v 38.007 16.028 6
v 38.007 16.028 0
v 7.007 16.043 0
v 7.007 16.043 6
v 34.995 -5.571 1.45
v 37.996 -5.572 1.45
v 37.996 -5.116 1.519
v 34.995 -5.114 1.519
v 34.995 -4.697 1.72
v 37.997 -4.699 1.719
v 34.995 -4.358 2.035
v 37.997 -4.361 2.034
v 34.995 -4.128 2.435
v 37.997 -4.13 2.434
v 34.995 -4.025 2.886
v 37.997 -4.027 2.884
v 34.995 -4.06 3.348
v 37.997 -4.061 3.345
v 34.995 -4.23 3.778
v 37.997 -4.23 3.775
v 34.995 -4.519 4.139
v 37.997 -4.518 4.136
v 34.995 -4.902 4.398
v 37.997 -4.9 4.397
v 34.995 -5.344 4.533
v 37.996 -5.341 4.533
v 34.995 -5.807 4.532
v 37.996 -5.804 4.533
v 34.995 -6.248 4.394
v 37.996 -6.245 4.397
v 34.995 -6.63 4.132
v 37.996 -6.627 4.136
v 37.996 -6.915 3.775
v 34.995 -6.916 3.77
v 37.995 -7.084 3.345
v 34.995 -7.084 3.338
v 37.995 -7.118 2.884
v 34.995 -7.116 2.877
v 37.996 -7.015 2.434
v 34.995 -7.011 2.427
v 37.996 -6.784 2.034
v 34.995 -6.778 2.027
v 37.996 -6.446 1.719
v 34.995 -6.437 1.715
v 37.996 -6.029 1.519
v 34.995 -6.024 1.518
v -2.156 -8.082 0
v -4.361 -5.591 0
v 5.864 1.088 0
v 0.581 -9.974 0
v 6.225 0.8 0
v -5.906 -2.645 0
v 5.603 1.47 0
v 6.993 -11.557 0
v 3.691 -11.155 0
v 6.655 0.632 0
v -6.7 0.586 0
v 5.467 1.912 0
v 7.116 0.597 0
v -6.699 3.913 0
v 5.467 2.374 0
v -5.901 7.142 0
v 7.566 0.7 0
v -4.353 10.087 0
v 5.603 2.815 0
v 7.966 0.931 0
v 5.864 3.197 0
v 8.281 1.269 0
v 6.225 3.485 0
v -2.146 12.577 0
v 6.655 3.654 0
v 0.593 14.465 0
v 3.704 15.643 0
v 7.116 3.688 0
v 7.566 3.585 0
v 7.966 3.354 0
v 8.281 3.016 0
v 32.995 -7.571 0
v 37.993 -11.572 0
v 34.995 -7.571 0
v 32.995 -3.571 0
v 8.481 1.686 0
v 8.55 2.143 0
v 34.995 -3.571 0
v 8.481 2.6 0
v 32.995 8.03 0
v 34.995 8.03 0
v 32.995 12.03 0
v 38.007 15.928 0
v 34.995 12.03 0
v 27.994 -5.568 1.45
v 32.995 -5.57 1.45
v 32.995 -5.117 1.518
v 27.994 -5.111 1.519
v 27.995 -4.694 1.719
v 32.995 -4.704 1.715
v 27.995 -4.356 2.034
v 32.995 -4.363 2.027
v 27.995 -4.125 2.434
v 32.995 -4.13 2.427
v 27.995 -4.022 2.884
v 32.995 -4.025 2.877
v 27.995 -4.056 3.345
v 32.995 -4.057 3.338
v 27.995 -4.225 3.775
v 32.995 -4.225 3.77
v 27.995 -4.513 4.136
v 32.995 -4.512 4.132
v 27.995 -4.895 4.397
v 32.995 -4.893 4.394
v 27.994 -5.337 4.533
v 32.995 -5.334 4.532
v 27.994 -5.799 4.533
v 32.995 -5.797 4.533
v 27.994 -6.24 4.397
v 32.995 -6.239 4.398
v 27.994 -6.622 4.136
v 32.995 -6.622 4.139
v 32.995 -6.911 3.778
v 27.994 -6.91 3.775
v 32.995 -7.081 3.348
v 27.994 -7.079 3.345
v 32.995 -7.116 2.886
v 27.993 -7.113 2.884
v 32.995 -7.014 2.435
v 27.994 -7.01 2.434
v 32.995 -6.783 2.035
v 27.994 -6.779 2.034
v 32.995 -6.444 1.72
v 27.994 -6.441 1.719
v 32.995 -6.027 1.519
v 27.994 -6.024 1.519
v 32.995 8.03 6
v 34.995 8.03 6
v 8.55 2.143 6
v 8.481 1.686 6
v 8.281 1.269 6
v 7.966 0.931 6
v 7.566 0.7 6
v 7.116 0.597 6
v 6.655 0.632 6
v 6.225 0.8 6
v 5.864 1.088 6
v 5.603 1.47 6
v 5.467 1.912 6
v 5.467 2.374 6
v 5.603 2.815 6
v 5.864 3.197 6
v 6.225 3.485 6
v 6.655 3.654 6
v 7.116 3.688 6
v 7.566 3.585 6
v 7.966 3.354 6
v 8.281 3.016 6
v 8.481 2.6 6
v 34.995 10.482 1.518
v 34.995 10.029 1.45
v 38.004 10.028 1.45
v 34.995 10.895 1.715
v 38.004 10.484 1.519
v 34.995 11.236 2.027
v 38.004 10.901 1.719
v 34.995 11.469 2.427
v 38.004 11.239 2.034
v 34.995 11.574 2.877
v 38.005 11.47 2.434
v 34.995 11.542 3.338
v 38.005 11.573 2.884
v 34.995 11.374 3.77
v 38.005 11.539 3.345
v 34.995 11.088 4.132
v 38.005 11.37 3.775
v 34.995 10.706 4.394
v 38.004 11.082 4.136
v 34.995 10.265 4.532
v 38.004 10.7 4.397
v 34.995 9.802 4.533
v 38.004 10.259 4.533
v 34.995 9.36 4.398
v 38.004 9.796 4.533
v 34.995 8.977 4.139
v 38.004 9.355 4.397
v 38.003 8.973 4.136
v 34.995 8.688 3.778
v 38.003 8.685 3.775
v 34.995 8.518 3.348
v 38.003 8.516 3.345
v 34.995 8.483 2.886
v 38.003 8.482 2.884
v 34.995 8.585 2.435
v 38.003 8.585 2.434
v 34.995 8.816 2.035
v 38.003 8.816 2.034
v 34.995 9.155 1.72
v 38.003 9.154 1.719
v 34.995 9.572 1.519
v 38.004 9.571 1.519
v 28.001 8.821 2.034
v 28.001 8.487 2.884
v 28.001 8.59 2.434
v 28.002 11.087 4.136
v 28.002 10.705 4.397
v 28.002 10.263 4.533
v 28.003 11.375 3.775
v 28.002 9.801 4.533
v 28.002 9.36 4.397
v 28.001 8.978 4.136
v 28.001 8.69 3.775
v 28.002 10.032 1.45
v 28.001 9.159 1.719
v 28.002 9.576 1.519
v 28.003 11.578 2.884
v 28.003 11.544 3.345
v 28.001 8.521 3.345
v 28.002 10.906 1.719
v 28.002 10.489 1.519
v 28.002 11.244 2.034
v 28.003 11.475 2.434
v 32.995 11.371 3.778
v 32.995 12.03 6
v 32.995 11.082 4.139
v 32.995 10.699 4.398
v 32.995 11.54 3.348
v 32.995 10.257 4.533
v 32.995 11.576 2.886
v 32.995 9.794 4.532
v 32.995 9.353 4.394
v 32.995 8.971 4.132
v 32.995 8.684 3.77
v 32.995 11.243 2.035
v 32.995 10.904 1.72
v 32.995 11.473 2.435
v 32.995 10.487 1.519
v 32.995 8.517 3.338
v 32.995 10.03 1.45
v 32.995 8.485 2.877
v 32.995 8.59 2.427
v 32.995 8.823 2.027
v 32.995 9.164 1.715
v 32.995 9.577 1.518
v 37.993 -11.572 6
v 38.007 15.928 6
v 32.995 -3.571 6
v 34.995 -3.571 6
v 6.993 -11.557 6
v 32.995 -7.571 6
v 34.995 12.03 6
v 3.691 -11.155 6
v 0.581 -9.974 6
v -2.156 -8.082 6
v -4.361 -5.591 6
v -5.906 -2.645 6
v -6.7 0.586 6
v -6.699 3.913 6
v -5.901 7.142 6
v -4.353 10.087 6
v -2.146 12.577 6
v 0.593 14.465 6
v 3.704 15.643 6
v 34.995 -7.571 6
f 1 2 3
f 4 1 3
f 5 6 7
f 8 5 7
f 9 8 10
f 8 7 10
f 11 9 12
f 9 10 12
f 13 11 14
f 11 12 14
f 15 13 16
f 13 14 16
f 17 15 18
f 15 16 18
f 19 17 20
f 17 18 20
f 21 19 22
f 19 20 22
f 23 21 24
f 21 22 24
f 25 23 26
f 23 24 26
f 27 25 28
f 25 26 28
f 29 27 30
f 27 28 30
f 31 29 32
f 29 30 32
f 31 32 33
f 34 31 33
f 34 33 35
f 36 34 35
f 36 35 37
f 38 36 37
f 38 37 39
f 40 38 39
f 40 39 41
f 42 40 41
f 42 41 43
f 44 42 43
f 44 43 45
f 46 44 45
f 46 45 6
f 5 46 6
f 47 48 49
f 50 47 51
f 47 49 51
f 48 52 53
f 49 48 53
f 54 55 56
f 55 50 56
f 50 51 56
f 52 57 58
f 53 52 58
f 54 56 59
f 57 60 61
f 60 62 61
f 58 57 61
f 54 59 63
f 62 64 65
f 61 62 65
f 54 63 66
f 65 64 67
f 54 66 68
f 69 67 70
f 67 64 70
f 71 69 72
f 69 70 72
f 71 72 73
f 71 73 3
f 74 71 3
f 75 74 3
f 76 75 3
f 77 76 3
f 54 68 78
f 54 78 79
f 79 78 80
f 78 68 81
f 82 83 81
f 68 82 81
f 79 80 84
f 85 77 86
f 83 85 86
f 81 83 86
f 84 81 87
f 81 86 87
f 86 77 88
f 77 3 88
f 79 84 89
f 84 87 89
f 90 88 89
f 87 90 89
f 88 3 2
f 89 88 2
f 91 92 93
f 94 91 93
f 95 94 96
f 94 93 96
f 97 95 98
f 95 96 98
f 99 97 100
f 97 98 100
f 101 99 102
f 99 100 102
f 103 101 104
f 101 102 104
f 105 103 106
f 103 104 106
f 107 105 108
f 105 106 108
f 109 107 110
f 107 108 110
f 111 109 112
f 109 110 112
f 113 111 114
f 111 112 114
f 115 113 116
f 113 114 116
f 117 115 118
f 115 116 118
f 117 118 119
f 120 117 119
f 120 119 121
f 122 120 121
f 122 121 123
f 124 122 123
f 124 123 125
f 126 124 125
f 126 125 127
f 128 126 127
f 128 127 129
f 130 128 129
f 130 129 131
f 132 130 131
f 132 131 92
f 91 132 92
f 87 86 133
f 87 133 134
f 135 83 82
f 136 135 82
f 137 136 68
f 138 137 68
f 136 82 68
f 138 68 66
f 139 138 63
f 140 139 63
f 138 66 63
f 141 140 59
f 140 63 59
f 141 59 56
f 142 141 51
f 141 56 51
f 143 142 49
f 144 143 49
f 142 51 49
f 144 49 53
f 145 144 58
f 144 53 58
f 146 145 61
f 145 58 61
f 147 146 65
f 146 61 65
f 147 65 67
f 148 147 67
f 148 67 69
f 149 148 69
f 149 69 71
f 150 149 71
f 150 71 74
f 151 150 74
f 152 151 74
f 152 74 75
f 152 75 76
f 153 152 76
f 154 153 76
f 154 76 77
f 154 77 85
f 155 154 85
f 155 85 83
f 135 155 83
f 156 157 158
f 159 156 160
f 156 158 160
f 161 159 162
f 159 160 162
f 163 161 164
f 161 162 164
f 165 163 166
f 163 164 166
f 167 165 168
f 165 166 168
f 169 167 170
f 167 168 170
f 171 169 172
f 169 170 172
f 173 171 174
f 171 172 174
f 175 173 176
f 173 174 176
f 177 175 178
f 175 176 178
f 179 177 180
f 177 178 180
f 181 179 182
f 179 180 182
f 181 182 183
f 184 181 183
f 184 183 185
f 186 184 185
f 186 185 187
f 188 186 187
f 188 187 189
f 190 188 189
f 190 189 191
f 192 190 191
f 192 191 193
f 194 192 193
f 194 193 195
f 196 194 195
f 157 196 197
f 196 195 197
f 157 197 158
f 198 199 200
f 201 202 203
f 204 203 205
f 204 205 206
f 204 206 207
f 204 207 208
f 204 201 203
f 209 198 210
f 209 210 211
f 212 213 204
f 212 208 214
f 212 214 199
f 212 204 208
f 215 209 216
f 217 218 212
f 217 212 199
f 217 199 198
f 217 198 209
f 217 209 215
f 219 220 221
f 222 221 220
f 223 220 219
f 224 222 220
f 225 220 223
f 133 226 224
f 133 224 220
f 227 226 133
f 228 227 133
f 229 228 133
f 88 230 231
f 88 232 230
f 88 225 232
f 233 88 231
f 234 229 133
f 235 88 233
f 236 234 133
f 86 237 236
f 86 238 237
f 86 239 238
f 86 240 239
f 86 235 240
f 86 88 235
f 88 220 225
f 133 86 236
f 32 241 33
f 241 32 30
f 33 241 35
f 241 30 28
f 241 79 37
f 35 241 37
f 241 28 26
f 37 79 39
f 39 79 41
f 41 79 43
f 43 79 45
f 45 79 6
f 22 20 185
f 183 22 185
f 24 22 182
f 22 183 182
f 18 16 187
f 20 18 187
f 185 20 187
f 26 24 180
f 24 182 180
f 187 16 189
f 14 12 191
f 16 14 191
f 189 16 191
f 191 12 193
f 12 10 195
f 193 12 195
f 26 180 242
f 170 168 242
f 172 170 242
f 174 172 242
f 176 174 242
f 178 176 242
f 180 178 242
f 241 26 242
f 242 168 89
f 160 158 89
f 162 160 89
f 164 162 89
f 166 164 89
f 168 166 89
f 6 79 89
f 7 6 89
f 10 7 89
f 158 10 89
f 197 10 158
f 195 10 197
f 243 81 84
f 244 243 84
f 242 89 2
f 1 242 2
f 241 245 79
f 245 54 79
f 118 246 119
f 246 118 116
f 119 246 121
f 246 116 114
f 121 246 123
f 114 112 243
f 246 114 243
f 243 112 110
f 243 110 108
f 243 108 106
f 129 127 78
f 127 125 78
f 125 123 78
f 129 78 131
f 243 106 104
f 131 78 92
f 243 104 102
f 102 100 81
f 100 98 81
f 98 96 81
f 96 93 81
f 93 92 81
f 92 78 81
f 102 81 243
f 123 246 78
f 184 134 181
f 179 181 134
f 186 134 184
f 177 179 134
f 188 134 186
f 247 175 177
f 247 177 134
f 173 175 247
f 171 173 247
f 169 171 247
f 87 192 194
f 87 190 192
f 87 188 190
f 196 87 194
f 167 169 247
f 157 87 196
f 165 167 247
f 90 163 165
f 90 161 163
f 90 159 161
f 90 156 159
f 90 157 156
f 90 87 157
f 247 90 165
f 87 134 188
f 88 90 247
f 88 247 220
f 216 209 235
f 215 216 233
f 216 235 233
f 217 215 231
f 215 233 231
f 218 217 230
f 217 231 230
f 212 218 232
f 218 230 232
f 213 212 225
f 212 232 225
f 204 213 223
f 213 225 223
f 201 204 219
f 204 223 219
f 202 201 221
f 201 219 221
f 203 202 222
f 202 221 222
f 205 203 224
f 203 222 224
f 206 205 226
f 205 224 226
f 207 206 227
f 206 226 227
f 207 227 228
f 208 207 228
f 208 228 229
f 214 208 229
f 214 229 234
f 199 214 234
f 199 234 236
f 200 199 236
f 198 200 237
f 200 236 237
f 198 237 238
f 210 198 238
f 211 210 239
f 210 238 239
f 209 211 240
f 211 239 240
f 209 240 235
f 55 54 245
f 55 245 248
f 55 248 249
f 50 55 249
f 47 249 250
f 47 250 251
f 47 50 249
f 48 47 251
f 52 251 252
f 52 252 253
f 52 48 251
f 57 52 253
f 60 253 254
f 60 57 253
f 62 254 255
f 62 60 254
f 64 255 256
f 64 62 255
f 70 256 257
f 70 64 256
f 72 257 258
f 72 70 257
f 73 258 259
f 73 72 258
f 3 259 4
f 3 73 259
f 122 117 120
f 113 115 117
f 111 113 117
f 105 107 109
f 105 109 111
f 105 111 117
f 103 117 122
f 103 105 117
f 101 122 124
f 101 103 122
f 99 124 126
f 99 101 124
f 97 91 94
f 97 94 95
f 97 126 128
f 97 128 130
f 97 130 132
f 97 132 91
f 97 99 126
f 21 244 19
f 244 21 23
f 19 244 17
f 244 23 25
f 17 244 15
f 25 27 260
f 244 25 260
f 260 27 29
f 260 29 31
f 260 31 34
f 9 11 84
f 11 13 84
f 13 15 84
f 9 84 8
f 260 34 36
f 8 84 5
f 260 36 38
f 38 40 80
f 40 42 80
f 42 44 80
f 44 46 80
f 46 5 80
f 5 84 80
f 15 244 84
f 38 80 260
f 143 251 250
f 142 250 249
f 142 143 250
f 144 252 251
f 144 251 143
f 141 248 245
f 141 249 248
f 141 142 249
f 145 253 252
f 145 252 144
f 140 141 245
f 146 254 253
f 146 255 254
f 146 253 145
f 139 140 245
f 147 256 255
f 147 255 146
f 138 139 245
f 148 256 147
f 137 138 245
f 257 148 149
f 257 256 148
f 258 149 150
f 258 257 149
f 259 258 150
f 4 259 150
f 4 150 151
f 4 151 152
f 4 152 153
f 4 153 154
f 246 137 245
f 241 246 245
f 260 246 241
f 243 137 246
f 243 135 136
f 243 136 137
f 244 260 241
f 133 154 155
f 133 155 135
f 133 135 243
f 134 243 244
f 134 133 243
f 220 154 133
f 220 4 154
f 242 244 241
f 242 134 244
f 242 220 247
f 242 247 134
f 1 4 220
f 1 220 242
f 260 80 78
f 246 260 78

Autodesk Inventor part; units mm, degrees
ref_plane "YZ Plane" through (0, 0, 0) normal (1, 0, 0) x (0, 1, 0)
ref_plane "XZ Plane" through (0, 0, 0) normal (0, 1, 0) x (-1, 0, 0)
ref_plane "XY Plane" through (0, 0, 0) normal (0, 0, 1) x (1, 0, 0)
ref_plane "작업 평면1" through (0, 0, 0) normal (0, 0, 1) x (1, 0, 0)
sketch "스케치1" plane through (0, 0, 0) normal (0, 0, 1) x (1, 0, 0)
  line L0 (6.993261, -11.657355) -> (26.993258, -11.667122)
  arc A0 (7.006739, 15.942642) -> (6.993261, -11.657355) centre (7, 2.142643) ccw
  line L1 (27.006737, 15.932875) -> (7.006739, 15.942642)
  line L2 (26.993258, -11.667122) -> (27.006737, 15.932875)
  circle A1 centre (-0.776779, -5.636927) radius 1.65
  circle A2 centre (-4, 2.140669) radius 1.65
  circle A3 centre (-0.77957, 9.919422) radius 1.65
  circle A4 centre (6.998026, 13.142643) radius 1.65
  circle A5 centre (14.776779, 9.922214) radius 1.65
  circle A6 centre (18, 2.144617) radius 1.65
  circle A7 centre (14.77957, -5.634135) radius 1.65
  circle A8 centre (7.001974, -8.857357) radius 1.65
  circle A9 centre (7, 2.142643) radius 5.1
  circle A10 centre (7, 2.142643) radius 3.55
  line L3 (6.99331, -11.557355) -> (26.993307, -11.567122)
  line L4 (26.993307, -11.567122) -> (27.006786, 16.032875)
  line L5 (27.006786, 16.032875) -> (7.006788, 16.042642)
  arc A11 (7.006788, 16.042642) -> (6.99331, -11.557355) centre (7.000049, 2.242643) ccw
  circle A12 centre (-0.781923, -5.531732) radius 1.65
  circle A13 centre (-3.99995, 2.248015) radius 1.65
  circle A14 centre (-0.774326, 10.024615) radius 1.65
  circle A15 centre (7.005421, 13.242642) radius 1.65
  circle A16 centre (14.782021, 10.017018) radius 1.65
  circle A17 centre (18.000048, 2.237271) radius 1.65
  circle A18 centre (14.774424, -5.539329) radius 1.65
  circle A19 centre (6.994677, -8.757356) radius 1.65
  circle A20 centre (7.000049, 2.242643) radius 5.1
  point P0 (0, 0)
  dimension "d0" = 7.1
extrude "돌출1" add sketch "스케치1" along normal blind 6 contours A11 L5 L4 L1 A0 | A0 L1 L2 L3 A11 | A1 A12 | A12 A1 | A1 A12 | A2 A13 | A13 A2 | A2 A13 | A14 A3 | A3 A14 | A3 A14 | A4 A15 | A4 A15 | A15 A4 | A5 A16 | A5 A16 | A16 A5 | A6 | A7 A18 | A18 A7 | A7 A18 | A8 A19 | A19 A8 | A8 A19 | A20 A9 | A9 A20 | A9 A20 | A17
offset faces "크기1" outward 2 faces at (10.504028, 1.573183, 4)
move faces "이동1" translate (4.999999, -0.002442, 0) faces at (27.00226, 6.766209, 4)
move faces "이동2" translate (1, -0.000488, 0) faces at (32.006753, 15.963766, 2) (32.00226, 6.763767, 4)
move faces "이동3" translate (4.999999, -0.002442, 0) faces at (33.006752, 15.963278, 2) (32.997783, -2.403387, 4)
sketch "스케치3" plane through (38.006784, 16.027503, 6) normal (0.9999999, -0.0004883, 0) x (0, 0, -1)
  circle A0 centre (3, -6) radius 1.55
  circle A1 centre (57.100995, -6.1) radius 1.55
  circle A2 centre (3, -21.6) radius 1.55
  circle A3 centre (57.100995, -21.7) radius 1.55
  line L0 (-17.781018, 8.082697) -> (114.718982, 8.082697)
  line L1 (-17.781018, -71.417303) -> (-17.781018, 8.082697)
  line L2 (114.718982, -71.417303) -> (-17.781018, -71.417303)
  line L3 (114.718982, 8.082697) -> (114.718982, -71.417303)
  point P0 (6, -16.046061)
extrude "돌출3" cut sketch "스케치3" against normal blind 10 contours A0 | A2
sketch "스케치4" plane through (0, 0, 0) normal (0, 0, -1) x (-1, 0, 0)
  line L0 (-38.006784, 16.027503) -> (-7.006788, 16.042642)
  line L1 (-33.358652, 16.029773) -> (-33.358652, 12.029773)
  line L2 (-33.358652, 16.029773) -> (-29.358652, 16.029773) construction
  line L3 (-6.99331, -11.557355) -> (-37.993306, -11.572494)
  line L4 (-34.023529, -11.570555) -> (-34.023529, -7.570555)
  line L5 (-34.023529, -11.570555) -> (-30.023529, -11.570555) construction
  line L6 (-37.993306, -11.572494) -> (-38.006784, 16.027503)
  line L7 (-37.995039, -8.023851) -> (-34.995039, -8.023851)
  line L8 (-37.995039, -8.023851) -> (-34.995039, -8.023851) construction
  line L9 (-34.995039, -7.570555) -> (-32.995039, -7.570555)
  line L10 (-32.995039, -7.570555) -> (-32.995039, -3.570555)
  line L11 (-32.995039, -3.570555) -> (-34.995039, -3.570555)
  line L12 (-34.995039, -3.570555) -> (-34.995039, -7.570555)
  line L13 (-34.995039, 12.029773) -> (-32.995039, 12.029773)
  line L14 (-32.995039, 12.029773) -> (-32.995039, 8.029773)
  line L15 (-32.995039, 8.029773) -> (-34.995039, 8.029773)
  line L16 (-34.995039, 8.029773) -> (-34.995039, 12.029773)
  point P0 (0, 0)
  dimension "d17" = 4
  dimension "d18" = 90
  dimension "d19" = 4
  dimension "d20" = 90
  dimension "d21" = 3
  dimension "d22" = 0
  dimension "d23" = 2
  dimension "d24" = 4
  dimension "d25" = 2
  dimension "d26" = 4
extrude "돌출4" cut sketch "스케치4" against normal blind 10
properties part number "6" material "아크릴, 선명"
